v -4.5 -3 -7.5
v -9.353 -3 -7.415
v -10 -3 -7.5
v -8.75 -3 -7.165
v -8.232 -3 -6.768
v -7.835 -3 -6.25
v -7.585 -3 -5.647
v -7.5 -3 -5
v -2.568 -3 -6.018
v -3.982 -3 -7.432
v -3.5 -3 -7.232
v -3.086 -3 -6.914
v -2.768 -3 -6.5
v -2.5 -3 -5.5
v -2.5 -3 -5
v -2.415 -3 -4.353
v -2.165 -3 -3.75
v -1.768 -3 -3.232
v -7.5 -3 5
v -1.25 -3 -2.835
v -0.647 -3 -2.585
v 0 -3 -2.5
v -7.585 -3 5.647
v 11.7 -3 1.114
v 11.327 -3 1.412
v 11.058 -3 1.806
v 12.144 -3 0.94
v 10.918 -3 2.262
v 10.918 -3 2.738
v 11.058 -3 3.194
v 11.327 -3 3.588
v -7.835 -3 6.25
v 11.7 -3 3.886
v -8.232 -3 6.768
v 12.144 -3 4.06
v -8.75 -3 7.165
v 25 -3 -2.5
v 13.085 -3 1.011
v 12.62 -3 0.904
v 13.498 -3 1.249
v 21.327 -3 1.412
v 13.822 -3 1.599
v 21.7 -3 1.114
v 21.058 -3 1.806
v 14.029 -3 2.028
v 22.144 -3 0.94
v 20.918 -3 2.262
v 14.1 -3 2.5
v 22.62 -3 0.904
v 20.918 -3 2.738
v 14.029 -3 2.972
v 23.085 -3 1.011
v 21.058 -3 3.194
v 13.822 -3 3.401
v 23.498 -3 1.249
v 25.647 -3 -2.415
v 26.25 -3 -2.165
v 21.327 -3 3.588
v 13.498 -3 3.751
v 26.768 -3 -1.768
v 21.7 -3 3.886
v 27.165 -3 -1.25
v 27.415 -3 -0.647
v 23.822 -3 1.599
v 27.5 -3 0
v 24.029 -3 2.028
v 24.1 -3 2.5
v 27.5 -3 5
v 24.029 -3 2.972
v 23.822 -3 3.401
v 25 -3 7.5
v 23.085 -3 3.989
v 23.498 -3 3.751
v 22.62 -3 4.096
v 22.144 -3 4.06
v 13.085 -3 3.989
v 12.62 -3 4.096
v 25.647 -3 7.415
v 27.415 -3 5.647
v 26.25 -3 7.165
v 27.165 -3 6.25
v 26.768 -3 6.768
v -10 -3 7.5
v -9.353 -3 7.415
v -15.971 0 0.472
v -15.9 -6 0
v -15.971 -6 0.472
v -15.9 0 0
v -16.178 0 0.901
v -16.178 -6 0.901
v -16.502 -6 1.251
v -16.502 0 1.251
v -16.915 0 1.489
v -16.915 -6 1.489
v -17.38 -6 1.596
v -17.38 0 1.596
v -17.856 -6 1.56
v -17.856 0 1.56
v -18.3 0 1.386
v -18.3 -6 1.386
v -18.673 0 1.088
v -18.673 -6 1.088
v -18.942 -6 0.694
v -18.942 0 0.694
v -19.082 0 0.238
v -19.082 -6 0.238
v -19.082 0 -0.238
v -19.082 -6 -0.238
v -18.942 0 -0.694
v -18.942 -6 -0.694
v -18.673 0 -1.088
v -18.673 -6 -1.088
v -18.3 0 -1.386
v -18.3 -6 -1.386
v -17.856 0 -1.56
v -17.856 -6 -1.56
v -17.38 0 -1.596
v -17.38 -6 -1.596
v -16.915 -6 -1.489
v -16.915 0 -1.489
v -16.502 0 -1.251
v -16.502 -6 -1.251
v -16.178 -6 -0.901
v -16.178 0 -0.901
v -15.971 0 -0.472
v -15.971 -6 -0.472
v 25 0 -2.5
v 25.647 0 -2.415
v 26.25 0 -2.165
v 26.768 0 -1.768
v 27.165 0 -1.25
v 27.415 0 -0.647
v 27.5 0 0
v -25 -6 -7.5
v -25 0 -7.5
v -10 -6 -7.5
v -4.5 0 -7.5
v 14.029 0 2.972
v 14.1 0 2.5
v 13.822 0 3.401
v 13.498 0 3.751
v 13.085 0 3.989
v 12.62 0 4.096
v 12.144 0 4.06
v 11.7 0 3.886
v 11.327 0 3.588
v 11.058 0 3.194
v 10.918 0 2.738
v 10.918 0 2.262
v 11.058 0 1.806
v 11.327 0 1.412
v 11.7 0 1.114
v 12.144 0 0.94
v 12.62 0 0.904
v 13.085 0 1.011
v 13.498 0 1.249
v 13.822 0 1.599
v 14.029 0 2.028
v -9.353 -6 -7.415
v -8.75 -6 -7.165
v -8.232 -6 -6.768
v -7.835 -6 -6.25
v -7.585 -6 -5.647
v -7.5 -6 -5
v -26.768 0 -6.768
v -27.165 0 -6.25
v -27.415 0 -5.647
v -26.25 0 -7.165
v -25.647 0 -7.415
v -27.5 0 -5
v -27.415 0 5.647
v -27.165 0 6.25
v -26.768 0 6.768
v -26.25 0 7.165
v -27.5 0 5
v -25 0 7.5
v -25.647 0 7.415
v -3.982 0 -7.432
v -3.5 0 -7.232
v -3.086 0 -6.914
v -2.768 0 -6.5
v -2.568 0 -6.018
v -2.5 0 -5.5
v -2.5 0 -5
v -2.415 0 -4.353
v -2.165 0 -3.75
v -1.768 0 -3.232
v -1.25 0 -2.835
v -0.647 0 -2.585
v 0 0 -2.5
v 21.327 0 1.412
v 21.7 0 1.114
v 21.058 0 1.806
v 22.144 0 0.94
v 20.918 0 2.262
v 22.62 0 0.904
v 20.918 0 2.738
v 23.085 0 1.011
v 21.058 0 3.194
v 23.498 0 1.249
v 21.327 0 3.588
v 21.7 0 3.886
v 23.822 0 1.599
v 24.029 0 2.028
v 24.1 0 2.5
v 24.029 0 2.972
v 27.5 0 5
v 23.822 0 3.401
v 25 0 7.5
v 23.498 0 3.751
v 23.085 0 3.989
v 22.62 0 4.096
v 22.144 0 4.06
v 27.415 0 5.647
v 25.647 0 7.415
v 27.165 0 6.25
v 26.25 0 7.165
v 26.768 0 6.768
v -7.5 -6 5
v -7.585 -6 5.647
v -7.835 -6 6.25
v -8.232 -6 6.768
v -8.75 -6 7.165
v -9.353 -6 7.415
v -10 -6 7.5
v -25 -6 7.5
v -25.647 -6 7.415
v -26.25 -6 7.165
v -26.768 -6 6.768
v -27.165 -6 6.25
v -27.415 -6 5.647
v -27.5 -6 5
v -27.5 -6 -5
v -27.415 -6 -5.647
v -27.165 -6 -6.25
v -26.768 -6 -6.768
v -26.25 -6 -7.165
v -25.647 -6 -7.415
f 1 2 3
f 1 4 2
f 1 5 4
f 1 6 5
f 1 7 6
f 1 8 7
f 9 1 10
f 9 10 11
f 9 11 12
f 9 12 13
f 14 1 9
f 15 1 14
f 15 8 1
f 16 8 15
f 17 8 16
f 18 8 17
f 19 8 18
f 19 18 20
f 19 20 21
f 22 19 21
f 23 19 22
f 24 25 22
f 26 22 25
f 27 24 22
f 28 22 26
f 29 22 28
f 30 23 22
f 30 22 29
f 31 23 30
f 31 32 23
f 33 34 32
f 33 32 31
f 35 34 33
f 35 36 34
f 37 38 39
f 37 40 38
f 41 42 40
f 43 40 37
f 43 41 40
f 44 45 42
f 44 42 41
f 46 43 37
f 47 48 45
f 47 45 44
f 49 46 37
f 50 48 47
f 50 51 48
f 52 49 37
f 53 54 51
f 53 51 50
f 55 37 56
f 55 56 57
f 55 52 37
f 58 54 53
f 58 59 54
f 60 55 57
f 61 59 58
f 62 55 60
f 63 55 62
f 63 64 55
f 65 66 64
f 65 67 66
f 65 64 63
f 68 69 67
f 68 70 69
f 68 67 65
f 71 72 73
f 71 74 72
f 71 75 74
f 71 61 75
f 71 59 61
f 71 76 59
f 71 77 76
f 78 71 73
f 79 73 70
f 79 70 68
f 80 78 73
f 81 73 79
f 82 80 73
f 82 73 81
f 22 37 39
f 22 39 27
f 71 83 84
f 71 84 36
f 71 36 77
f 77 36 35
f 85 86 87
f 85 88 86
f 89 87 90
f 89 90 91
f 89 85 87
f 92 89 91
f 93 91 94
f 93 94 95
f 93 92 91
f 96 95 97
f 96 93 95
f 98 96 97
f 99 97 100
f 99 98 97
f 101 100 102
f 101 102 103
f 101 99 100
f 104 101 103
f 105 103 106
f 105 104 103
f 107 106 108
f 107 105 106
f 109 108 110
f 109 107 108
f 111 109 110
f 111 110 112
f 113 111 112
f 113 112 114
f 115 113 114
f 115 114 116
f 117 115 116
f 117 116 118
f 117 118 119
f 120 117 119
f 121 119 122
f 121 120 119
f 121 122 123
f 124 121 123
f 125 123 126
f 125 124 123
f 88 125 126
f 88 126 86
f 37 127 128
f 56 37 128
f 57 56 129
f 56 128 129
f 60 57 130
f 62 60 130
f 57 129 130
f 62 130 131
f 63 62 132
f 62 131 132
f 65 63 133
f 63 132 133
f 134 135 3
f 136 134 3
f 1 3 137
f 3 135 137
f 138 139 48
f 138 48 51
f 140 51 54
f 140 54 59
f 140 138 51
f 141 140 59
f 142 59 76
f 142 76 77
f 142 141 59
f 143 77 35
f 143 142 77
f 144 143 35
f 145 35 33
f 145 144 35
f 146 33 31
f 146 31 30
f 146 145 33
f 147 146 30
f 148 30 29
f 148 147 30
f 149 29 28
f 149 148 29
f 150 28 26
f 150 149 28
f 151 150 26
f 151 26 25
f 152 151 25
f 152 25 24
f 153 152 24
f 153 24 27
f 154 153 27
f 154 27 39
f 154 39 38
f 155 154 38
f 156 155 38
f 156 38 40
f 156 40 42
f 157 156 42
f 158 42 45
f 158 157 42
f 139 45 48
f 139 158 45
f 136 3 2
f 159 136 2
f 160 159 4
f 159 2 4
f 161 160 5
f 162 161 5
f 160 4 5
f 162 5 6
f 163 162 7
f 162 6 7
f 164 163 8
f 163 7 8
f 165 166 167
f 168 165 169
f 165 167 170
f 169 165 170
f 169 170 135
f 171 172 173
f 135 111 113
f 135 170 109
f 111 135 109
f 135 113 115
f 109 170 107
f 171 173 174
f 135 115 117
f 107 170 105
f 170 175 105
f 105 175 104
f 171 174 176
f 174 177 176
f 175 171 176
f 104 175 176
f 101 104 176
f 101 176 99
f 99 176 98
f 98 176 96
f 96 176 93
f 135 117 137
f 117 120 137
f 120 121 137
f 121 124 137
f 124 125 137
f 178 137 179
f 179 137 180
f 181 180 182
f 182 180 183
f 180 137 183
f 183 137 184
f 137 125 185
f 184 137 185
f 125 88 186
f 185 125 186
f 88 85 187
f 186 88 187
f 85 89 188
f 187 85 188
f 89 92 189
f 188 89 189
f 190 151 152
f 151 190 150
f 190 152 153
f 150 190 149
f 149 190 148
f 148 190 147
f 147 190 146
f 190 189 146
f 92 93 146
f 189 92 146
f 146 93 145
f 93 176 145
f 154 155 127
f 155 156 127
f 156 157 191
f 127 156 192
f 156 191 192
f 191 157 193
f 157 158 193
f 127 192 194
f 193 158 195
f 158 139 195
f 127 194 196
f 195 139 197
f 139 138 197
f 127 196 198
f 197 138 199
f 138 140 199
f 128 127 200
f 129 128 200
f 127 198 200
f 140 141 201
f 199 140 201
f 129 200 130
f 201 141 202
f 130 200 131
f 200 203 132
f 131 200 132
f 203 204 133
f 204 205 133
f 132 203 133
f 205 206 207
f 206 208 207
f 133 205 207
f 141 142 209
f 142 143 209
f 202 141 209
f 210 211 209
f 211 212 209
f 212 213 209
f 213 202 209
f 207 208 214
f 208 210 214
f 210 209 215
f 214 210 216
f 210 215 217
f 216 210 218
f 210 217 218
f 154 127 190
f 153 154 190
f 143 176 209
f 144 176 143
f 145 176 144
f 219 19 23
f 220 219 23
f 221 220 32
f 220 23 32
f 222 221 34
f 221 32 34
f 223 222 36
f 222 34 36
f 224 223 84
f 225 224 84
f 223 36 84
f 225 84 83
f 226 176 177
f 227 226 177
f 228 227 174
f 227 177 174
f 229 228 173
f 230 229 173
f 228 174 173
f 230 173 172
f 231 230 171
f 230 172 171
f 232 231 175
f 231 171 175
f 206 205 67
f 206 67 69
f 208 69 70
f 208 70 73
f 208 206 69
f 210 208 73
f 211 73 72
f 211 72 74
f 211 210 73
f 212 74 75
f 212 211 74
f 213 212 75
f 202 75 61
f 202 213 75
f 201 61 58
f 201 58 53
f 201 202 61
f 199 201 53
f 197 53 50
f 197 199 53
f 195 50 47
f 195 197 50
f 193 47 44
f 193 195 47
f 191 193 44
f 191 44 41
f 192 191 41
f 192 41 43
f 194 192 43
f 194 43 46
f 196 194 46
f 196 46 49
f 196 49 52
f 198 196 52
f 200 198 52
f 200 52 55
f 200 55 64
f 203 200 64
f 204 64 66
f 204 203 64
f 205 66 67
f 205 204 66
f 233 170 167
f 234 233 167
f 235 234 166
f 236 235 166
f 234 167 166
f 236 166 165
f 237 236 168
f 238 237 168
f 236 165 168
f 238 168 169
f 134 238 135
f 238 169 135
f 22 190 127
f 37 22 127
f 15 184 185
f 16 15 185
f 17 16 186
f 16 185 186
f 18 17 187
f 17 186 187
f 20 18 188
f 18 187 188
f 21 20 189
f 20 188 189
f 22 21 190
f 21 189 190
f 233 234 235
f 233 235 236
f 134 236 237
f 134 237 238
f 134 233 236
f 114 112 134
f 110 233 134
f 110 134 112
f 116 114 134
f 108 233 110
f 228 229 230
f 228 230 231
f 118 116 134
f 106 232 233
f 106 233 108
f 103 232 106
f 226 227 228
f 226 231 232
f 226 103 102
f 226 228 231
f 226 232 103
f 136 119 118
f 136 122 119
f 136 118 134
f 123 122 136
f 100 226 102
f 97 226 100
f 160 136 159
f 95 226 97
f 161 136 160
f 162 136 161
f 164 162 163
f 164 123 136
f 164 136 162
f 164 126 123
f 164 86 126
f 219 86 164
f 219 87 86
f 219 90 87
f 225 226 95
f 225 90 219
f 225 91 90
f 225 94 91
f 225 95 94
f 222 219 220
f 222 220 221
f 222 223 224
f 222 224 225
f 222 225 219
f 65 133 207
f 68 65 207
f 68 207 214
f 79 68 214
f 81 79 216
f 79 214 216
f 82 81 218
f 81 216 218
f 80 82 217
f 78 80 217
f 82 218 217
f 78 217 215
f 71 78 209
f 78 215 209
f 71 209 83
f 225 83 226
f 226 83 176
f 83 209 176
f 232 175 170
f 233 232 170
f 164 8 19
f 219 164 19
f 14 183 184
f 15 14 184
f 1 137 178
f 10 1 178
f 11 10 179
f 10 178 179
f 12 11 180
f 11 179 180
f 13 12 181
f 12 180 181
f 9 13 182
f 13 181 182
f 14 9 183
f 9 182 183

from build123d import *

# Parameters (mm, degrees)
F0_R     = 1.6
F1_DEPTH = 3
F2_R     = 1.6
F3_DEPTH = 3


with BuildPart() as f1:
    # F0 (on Front) → F1 (new body)
    with BuildSketch(Plane.XZ):
        with BuildLine():
            Line((-25, -7.5), (-4.5, -7.5))
            ThreePointArc((-4.5, -7.5), (-3.085786, -6.914214), (-2.5, -5.5))
            Line((-2.5, -5.5), (-2.5, -5))
            ThreePointArc((-2.5, -5), (-1.767767, -3.232233), (0, -2.5))
            Line((0, -2.5), (25, -2.5))
            ThreePointArc((25, -2.5), (26.767767, -1.767767), (27.5, 0))
            Line((27.5, 0), (27.5, 5))
            ThreePointArc((27.5, 5), (26.767767, 6.767767), (25, 7.5))
            Line((25, 7.5), (-25, 7.5))
            ThreePointArc((-25, 7.5), (-26.767767, 6.767767), (-27.5, 5))
            Line((-27.5, 5), (-27.5, -5))
            ThreePointArc((-27.5, -5), (-26.767767, -6.767767), (-25, -7.5))
        make_face()
        with Locations((-17.5, 0)):
            Circle(F0_R, mode=Mode.SUBTRACT)
        with Locations((12.5, 2.5)):
            Circle(F0_R, mode=Mode.SUBTRACT)
        with Locations((22.5, 2.5)):
            Circle(F0_R, mode=Mode.SUBTRACT)
    extrude(amount=F1_DEPTH)

    # F2 (on face) → F3 (join)
    with BuildSketch(Plane.XZ.offset(3)):
        with BuildLine():
            Line((-25, -7.5), (-10, -7.5))
            ThreePointArc((-10, -7.5), (-8.232233, -6.767767), (-7.5, -5))
            Line((-7.5, -5), (-7.5, 5))
            ThreePointArc((-7.5, 5), (-8.232233, 6.767767), (-10, 7.5))
            Line((-10, 7.5), (-25, 7.5))
            ThreePointArc((-25, 7.5), (-26.767767, 6.767767), (-27.5, 5))
            Line((-27.5, 5), (-27.5, -5))
            ThreePointArc((-27.5, -5), (-26.767767, -6.767767), (-25, -7.5))
        make_face()
        with Locations((-17.5, 0)):
            Circle(F2_R, mode=Mode.SUBTRACT)
    extrude(amount=F3_DEPTH)


solid = f1.part
